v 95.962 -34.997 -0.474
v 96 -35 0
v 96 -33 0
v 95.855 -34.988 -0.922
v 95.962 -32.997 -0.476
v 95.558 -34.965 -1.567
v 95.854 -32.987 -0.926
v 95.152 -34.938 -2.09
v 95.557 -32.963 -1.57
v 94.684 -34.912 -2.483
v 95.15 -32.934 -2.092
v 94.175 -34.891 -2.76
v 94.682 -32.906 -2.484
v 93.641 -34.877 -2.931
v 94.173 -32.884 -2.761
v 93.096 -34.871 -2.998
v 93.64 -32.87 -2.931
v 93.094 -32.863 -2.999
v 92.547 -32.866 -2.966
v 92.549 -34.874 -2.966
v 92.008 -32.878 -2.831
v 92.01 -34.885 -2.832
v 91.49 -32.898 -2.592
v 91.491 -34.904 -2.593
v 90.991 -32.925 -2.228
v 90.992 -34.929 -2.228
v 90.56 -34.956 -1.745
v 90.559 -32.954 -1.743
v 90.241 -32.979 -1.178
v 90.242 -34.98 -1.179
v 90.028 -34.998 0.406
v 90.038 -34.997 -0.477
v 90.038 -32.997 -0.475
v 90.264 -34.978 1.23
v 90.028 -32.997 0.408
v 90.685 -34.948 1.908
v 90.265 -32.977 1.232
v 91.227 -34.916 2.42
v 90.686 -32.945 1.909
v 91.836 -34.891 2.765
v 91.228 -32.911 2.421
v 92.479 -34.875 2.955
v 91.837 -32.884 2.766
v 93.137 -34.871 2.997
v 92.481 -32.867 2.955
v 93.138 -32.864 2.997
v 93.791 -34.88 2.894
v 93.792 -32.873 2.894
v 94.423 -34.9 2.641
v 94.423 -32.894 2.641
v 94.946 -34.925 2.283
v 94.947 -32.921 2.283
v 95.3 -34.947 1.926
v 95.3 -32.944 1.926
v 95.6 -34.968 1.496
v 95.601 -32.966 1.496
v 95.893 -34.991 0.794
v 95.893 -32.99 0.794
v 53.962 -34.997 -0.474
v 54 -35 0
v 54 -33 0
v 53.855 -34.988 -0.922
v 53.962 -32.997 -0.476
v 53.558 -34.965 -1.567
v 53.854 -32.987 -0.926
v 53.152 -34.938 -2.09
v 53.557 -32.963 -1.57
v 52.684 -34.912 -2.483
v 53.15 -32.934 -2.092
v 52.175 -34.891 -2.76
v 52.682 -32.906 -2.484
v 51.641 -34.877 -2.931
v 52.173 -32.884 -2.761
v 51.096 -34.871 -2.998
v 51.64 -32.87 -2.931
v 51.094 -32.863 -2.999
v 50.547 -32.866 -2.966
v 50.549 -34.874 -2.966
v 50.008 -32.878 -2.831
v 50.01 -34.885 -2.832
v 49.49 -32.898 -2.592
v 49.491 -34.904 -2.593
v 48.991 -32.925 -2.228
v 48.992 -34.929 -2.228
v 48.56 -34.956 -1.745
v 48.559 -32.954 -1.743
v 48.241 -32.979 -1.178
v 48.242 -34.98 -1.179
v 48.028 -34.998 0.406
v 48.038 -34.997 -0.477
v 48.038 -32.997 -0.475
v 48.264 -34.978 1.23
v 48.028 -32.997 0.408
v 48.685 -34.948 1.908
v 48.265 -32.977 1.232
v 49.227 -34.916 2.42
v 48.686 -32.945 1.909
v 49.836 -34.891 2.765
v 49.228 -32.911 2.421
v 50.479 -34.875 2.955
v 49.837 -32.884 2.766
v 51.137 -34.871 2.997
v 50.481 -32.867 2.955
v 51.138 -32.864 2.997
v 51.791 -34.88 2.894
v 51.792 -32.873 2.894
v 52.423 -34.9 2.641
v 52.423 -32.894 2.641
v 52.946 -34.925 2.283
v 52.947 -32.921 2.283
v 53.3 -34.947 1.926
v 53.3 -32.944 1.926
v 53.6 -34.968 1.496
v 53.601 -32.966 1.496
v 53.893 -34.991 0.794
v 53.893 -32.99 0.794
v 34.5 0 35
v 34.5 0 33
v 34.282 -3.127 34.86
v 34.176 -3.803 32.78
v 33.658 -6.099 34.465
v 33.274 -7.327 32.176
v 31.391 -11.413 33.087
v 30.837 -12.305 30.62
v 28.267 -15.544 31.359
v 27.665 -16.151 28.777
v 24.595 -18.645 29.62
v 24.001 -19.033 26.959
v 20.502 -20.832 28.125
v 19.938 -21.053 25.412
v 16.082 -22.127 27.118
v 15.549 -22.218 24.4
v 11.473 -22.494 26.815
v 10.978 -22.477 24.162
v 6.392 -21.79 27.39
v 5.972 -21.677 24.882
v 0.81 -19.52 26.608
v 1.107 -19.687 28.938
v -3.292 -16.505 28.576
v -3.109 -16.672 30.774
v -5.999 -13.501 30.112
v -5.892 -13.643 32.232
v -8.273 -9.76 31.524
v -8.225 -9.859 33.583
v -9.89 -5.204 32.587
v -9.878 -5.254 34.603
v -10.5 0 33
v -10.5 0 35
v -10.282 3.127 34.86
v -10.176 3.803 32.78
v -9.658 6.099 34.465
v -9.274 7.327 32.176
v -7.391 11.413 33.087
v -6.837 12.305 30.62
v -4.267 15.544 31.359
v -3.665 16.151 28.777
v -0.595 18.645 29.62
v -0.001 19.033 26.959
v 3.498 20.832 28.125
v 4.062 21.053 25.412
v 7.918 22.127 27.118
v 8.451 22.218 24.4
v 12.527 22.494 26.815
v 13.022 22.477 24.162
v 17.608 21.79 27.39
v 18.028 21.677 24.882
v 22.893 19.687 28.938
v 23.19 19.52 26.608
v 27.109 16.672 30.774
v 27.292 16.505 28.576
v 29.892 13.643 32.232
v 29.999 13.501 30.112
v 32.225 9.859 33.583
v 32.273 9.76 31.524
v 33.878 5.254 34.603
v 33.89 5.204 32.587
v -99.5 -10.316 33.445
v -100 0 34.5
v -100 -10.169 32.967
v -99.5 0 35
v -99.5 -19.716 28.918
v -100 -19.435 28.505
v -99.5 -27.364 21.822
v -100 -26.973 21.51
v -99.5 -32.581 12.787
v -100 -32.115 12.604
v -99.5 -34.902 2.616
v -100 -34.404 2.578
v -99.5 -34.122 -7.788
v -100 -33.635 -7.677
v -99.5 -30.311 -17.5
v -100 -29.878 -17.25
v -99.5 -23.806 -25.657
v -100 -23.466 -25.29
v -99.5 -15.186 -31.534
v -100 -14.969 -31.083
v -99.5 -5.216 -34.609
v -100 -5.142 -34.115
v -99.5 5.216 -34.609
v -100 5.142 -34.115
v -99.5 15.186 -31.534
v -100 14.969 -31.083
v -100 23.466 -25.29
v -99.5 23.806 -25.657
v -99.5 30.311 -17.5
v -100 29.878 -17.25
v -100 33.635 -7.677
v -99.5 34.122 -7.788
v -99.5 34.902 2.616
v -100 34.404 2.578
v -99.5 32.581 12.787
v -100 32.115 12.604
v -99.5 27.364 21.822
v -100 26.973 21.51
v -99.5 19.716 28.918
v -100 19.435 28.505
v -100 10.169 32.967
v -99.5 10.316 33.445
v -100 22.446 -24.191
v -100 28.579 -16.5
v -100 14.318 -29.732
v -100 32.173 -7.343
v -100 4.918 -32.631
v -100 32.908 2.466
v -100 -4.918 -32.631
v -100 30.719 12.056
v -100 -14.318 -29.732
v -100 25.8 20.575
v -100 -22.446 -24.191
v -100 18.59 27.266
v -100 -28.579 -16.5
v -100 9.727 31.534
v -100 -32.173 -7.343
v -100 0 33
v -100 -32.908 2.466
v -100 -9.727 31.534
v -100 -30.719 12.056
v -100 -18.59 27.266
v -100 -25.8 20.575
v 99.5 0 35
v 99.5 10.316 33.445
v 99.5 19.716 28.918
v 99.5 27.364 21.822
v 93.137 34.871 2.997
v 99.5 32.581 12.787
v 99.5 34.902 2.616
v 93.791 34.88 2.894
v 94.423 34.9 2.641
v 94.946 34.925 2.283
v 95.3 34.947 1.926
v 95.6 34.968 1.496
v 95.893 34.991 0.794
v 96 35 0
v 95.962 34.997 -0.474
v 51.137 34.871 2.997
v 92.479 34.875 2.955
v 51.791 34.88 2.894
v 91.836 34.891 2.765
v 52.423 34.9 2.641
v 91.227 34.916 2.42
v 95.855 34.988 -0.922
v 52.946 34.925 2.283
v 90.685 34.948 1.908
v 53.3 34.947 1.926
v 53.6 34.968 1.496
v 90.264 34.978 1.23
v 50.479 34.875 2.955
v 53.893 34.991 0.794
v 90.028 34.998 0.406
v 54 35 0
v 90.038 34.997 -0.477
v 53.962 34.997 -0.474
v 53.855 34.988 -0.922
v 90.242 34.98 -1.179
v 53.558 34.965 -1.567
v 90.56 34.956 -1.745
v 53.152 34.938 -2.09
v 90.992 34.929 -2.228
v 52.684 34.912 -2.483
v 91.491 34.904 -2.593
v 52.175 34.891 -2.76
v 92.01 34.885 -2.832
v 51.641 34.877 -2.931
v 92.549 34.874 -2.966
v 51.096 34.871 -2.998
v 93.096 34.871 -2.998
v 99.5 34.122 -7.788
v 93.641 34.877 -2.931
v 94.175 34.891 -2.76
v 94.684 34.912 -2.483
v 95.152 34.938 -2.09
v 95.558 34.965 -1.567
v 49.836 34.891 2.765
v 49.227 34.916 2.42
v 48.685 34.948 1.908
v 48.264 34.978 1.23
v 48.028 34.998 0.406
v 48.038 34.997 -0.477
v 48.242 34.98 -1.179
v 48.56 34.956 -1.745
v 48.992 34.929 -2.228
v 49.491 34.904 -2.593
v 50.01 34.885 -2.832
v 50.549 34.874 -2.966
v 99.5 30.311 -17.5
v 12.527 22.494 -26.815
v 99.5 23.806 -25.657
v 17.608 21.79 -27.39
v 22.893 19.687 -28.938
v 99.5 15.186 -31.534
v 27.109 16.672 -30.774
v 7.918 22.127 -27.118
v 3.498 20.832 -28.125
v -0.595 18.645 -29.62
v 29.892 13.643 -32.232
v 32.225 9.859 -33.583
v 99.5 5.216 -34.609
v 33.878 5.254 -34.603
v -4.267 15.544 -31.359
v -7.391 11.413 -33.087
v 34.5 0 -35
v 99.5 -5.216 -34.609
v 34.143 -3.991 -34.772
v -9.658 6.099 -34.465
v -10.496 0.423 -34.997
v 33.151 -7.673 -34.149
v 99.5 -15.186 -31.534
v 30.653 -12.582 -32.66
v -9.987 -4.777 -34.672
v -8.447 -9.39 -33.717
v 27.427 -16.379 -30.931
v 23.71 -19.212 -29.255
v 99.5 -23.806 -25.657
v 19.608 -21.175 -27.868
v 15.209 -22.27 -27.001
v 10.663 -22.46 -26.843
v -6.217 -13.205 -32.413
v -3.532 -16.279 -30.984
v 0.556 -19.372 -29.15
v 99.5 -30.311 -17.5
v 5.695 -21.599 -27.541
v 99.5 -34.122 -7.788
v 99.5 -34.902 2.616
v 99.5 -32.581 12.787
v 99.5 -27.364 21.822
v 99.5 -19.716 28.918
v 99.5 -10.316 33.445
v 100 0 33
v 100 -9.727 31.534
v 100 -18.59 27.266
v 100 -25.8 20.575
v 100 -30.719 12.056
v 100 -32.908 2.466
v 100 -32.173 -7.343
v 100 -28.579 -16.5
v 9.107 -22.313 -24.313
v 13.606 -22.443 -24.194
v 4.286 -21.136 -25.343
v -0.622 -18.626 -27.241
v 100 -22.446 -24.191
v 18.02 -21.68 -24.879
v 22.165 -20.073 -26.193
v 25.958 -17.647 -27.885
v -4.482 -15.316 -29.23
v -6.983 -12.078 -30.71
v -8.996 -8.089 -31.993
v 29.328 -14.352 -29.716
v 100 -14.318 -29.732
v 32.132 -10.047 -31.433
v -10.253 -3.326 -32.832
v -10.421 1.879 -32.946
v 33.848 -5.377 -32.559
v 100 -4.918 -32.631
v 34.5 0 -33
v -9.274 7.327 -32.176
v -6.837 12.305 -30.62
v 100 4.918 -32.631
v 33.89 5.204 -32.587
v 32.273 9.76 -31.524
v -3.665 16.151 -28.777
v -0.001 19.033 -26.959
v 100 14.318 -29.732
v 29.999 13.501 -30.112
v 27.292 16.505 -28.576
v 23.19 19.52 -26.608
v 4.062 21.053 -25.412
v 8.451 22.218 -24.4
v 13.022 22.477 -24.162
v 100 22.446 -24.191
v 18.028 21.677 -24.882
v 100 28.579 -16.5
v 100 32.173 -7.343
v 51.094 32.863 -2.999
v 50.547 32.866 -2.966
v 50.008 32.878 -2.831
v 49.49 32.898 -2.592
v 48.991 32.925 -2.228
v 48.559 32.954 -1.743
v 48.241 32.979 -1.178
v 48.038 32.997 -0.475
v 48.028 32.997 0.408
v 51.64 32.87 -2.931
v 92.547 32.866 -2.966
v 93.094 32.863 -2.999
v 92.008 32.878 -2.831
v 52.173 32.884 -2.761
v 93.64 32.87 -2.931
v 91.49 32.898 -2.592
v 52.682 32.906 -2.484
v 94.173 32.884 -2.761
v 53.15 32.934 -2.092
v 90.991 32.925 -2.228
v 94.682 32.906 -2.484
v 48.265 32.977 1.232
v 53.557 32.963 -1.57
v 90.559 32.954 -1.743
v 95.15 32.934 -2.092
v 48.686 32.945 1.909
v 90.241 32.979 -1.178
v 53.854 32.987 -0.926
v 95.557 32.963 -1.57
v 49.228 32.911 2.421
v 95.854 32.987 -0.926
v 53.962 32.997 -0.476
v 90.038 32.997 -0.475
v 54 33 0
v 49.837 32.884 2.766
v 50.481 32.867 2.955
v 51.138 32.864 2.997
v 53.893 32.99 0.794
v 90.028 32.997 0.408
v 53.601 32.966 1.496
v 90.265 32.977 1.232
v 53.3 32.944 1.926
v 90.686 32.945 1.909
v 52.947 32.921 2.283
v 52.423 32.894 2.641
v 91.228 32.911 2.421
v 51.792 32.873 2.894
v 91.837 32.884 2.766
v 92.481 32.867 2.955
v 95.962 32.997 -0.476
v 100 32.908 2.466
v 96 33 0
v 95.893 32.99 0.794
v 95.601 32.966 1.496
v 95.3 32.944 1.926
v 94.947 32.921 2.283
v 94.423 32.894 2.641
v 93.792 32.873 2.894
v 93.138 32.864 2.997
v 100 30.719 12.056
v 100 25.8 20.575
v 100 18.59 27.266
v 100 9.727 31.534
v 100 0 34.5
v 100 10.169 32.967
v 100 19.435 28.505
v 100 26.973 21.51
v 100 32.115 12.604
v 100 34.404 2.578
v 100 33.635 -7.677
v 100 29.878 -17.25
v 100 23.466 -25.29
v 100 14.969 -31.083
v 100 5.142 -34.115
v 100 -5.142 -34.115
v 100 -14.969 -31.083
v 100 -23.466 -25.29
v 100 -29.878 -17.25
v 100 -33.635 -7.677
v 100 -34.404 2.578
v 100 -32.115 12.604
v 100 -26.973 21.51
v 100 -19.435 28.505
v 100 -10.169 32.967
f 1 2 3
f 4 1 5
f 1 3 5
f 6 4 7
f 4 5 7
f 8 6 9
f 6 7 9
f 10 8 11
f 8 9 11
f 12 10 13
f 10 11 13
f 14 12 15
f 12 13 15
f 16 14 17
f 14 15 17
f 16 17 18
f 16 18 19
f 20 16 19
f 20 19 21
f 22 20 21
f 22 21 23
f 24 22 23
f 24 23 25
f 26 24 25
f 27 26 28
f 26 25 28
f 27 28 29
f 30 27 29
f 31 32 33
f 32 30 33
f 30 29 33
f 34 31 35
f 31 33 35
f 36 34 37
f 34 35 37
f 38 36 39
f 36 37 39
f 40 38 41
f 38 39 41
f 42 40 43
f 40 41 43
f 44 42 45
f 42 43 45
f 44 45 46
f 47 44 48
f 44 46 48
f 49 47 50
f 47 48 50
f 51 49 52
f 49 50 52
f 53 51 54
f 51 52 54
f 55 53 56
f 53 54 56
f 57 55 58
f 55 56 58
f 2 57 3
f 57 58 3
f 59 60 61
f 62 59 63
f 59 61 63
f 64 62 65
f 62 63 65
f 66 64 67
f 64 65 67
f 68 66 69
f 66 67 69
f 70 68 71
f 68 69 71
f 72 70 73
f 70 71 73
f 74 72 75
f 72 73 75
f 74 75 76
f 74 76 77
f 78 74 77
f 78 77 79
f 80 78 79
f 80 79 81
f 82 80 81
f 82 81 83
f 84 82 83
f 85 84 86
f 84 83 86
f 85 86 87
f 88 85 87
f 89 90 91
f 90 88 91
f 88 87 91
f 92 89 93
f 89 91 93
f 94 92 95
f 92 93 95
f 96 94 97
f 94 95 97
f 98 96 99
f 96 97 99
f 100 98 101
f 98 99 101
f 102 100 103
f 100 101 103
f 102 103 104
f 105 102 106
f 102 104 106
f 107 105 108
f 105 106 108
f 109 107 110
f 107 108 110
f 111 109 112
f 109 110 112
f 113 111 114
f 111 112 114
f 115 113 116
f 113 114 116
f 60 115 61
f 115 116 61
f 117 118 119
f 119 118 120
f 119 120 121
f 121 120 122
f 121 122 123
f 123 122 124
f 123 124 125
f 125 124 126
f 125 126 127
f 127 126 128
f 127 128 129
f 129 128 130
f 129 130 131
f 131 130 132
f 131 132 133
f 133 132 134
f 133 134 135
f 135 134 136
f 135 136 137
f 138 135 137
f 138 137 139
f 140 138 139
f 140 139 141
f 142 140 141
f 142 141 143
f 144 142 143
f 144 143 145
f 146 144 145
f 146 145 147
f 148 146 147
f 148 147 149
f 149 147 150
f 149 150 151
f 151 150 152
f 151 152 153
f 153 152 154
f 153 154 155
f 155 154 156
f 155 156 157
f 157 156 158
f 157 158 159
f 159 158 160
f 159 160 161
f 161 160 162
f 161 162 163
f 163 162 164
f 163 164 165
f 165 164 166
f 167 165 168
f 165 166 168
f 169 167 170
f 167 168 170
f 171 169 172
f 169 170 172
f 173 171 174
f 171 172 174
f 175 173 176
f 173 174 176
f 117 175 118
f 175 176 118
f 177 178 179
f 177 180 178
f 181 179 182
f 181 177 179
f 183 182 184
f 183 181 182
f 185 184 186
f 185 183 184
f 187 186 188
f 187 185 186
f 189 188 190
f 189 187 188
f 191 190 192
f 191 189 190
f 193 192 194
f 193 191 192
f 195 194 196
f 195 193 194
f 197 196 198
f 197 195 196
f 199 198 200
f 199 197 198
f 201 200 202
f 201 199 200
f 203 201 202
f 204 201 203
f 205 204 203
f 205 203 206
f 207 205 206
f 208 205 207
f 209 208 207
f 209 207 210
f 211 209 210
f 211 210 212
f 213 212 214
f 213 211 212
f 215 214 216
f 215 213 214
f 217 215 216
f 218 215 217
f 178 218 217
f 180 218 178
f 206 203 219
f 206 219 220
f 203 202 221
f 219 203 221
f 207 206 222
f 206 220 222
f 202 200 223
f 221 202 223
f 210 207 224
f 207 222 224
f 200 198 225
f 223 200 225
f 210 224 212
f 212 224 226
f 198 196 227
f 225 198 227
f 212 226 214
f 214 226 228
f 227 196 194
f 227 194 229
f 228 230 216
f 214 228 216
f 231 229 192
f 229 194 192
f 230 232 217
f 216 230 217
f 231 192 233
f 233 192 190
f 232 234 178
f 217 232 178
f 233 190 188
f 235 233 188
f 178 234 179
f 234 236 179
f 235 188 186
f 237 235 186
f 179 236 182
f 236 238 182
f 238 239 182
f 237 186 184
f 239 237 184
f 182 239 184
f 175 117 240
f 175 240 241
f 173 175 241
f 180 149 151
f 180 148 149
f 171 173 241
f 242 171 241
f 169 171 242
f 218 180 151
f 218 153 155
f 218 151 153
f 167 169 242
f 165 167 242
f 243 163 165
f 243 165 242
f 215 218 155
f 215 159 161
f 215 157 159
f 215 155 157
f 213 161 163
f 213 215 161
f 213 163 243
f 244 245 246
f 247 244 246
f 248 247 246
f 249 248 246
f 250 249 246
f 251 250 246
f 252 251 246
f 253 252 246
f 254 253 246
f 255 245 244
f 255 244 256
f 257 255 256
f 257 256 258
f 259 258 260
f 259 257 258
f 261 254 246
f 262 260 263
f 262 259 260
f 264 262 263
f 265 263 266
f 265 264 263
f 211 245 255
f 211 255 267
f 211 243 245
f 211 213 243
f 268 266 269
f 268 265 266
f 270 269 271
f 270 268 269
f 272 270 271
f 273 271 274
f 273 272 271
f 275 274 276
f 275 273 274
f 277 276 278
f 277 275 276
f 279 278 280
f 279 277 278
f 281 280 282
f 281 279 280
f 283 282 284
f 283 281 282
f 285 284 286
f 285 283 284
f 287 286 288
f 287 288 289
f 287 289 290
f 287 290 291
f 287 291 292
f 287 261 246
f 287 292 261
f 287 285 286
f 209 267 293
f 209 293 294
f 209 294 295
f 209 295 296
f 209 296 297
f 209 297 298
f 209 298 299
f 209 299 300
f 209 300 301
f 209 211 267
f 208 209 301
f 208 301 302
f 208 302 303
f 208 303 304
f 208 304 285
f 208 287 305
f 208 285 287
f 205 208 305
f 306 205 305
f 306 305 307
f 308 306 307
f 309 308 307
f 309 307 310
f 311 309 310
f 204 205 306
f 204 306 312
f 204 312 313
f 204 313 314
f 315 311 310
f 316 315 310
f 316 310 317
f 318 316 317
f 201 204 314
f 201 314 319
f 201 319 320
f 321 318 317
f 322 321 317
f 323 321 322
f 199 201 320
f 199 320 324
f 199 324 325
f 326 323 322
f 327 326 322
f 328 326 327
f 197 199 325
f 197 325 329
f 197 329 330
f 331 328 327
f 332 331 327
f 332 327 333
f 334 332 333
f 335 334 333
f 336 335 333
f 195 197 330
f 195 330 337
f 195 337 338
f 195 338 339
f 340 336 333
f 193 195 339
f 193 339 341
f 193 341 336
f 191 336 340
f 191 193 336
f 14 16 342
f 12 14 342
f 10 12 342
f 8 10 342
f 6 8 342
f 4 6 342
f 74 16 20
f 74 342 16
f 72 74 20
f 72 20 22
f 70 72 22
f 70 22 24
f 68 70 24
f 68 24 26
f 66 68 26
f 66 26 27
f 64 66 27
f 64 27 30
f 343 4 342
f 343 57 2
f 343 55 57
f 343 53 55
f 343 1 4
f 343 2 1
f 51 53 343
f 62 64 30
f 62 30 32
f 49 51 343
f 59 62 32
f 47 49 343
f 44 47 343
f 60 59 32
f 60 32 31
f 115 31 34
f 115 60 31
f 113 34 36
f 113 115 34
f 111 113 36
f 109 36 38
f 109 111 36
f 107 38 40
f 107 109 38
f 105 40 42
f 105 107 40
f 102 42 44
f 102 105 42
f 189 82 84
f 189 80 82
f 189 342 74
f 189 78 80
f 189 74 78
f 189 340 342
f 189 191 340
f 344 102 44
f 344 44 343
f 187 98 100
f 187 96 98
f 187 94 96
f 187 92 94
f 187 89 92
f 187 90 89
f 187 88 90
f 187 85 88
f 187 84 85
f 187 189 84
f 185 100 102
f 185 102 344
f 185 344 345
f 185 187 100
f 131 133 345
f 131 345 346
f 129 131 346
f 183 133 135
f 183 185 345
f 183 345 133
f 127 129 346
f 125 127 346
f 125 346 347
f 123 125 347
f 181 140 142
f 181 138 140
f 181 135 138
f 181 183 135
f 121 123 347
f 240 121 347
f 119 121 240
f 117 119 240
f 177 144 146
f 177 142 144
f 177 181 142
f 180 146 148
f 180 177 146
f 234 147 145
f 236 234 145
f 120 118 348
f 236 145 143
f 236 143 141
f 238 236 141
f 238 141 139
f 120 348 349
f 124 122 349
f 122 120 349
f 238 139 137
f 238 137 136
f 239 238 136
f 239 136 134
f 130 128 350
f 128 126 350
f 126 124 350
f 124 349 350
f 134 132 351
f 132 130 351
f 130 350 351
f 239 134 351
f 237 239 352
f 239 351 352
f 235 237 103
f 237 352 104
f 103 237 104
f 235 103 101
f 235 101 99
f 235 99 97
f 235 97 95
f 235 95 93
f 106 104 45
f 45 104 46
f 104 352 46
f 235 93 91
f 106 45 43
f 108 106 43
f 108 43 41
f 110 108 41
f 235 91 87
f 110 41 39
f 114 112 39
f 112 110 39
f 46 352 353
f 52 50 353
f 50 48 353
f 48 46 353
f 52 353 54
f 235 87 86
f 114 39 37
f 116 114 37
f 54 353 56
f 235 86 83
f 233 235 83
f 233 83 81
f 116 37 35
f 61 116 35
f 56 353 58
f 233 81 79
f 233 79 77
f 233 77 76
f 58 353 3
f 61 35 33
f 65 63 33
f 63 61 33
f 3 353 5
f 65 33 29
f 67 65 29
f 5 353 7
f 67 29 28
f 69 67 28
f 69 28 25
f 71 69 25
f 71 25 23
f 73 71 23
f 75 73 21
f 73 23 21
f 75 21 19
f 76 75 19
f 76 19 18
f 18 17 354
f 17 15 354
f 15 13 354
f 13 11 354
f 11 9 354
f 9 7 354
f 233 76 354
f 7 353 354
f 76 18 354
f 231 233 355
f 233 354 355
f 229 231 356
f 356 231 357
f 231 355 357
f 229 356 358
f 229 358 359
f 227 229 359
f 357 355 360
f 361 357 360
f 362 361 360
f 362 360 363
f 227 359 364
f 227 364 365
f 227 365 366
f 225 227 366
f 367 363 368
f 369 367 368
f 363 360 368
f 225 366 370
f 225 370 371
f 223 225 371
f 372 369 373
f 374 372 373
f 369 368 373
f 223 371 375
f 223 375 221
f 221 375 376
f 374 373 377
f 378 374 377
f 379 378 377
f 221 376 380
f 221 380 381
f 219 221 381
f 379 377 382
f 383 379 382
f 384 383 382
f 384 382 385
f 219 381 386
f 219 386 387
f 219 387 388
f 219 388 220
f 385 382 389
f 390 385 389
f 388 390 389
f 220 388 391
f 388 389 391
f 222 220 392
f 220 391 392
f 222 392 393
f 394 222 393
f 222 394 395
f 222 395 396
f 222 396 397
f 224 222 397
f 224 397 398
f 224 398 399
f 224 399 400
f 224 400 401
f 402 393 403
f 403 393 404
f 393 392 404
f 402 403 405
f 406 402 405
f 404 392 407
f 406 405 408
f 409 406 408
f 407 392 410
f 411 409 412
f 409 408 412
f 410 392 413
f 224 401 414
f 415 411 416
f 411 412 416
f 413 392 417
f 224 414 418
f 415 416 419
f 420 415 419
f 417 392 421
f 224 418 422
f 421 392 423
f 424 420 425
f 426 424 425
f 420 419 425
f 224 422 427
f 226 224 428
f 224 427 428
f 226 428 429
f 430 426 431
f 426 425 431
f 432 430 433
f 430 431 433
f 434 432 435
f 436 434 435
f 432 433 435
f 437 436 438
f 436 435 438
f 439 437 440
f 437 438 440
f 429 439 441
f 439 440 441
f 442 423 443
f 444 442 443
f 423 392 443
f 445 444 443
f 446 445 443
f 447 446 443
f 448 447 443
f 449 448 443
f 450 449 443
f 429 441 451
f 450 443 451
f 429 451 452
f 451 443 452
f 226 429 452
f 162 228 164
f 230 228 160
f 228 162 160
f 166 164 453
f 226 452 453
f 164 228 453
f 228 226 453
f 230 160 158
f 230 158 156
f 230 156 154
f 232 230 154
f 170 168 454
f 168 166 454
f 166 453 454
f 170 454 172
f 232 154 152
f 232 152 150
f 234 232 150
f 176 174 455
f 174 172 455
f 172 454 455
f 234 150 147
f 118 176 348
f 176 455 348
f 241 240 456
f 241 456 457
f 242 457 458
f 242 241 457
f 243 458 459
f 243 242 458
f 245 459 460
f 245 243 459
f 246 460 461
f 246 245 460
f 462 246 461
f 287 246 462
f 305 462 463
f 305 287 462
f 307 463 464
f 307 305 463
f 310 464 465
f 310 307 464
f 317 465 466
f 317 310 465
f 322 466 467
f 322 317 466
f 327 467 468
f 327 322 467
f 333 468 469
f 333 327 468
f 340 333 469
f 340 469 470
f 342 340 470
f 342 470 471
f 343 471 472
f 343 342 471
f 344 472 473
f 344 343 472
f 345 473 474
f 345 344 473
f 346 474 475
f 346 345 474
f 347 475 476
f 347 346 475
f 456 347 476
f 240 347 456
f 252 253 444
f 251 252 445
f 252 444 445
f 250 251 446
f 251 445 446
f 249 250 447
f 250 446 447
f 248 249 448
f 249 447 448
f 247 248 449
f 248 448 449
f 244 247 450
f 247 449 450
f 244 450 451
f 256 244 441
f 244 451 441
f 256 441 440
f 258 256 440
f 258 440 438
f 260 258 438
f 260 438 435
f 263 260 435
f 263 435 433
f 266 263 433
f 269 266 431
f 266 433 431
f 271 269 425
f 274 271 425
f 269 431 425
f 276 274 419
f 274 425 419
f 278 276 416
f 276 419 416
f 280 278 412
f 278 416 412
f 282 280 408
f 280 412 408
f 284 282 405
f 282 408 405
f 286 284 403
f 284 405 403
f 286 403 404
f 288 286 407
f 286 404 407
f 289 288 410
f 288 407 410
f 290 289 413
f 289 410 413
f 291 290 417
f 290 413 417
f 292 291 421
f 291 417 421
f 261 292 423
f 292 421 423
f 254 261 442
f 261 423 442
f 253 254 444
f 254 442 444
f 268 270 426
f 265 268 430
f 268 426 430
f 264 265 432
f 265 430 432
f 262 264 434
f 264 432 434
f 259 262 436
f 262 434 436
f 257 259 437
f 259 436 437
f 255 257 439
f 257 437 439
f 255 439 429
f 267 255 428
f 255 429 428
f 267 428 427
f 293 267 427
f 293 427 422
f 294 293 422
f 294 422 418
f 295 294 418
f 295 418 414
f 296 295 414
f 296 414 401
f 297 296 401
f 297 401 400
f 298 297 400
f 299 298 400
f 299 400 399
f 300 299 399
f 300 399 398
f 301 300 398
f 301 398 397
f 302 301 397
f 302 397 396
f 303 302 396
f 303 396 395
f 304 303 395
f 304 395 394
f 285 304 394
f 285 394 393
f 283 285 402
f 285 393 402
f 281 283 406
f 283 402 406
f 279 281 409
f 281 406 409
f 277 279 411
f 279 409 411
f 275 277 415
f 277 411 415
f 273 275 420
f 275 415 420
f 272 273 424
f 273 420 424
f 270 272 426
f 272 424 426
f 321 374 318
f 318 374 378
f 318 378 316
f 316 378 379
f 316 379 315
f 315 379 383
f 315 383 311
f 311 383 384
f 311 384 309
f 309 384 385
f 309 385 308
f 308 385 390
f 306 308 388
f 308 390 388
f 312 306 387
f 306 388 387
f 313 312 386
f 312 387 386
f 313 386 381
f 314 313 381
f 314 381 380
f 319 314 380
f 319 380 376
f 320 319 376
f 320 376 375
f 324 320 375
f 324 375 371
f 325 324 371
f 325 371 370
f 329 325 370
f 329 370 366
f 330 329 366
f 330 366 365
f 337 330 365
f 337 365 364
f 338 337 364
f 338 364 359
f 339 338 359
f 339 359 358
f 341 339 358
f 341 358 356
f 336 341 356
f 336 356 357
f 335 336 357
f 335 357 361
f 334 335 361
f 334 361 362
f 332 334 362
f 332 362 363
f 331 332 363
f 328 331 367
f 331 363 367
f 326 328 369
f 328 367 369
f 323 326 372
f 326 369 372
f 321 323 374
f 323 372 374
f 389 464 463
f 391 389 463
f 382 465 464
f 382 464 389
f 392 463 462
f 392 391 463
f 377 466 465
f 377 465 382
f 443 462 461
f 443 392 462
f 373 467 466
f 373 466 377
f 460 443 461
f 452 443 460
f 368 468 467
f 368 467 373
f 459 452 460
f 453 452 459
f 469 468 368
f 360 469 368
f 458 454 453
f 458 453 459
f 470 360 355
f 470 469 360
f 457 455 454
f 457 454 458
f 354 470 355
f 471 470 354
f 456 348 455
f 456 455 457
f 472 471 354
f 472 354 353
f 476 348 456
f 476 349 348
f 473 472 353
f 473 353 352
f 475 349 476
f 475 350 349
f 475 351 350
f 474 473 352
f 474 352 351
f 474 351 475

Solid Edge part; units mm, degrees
sketch "Sketch1" plane through (0, 0, 0) normal (0, -1, 0) x (1, 0, 0)
  line L0 (-100, 33) -> (100, 33)
  line L1 (100, 33) -> (100, 35)
  line L2 (100, 35) -> (-100, 35)
  line L3 (-100, 35) -> (-100, 33)
  dimension "D1" = 2
  dimension "D2" = 200
revolve "RevolvedProtrusion1" add sketch "Sketch1" angle 360 about axis through (-60, 0, 0) along (1, 0, 0)
chamfer "pipe_chamfers" distance 0.5 angle 45 2 edges at (100, 0, -35) (-100, 0, -35)
sketch "Sketch2" plane through (0, 0, 0) normal (0, 0, 1) x (1, 0, 0)
  circle A0 centre (12, 0) radius 22.5
  dimension "D1" = 12
  dimension "D2" = 45
extrude "pipe_cutout" cut sketch "Sketch2" along normal mid plane 100
sketch "Sketch3" plane through (0, 0, 0) normal (0, -1, 0) x (1, 0, 0)
  circle A0 centre (93, 0) radius 3
  circle A1 centre (51, 0) radius 3
  dimension "D1" = 6
  dimension "D2" = 6
  dimension "D3" = 39
  dimension "D4" = 42
extrude "pin_cutouts_Profile_Plane1" cut sketch "Sketch3" along normal mid plane 100
properties material "Aluminum, 1060"
